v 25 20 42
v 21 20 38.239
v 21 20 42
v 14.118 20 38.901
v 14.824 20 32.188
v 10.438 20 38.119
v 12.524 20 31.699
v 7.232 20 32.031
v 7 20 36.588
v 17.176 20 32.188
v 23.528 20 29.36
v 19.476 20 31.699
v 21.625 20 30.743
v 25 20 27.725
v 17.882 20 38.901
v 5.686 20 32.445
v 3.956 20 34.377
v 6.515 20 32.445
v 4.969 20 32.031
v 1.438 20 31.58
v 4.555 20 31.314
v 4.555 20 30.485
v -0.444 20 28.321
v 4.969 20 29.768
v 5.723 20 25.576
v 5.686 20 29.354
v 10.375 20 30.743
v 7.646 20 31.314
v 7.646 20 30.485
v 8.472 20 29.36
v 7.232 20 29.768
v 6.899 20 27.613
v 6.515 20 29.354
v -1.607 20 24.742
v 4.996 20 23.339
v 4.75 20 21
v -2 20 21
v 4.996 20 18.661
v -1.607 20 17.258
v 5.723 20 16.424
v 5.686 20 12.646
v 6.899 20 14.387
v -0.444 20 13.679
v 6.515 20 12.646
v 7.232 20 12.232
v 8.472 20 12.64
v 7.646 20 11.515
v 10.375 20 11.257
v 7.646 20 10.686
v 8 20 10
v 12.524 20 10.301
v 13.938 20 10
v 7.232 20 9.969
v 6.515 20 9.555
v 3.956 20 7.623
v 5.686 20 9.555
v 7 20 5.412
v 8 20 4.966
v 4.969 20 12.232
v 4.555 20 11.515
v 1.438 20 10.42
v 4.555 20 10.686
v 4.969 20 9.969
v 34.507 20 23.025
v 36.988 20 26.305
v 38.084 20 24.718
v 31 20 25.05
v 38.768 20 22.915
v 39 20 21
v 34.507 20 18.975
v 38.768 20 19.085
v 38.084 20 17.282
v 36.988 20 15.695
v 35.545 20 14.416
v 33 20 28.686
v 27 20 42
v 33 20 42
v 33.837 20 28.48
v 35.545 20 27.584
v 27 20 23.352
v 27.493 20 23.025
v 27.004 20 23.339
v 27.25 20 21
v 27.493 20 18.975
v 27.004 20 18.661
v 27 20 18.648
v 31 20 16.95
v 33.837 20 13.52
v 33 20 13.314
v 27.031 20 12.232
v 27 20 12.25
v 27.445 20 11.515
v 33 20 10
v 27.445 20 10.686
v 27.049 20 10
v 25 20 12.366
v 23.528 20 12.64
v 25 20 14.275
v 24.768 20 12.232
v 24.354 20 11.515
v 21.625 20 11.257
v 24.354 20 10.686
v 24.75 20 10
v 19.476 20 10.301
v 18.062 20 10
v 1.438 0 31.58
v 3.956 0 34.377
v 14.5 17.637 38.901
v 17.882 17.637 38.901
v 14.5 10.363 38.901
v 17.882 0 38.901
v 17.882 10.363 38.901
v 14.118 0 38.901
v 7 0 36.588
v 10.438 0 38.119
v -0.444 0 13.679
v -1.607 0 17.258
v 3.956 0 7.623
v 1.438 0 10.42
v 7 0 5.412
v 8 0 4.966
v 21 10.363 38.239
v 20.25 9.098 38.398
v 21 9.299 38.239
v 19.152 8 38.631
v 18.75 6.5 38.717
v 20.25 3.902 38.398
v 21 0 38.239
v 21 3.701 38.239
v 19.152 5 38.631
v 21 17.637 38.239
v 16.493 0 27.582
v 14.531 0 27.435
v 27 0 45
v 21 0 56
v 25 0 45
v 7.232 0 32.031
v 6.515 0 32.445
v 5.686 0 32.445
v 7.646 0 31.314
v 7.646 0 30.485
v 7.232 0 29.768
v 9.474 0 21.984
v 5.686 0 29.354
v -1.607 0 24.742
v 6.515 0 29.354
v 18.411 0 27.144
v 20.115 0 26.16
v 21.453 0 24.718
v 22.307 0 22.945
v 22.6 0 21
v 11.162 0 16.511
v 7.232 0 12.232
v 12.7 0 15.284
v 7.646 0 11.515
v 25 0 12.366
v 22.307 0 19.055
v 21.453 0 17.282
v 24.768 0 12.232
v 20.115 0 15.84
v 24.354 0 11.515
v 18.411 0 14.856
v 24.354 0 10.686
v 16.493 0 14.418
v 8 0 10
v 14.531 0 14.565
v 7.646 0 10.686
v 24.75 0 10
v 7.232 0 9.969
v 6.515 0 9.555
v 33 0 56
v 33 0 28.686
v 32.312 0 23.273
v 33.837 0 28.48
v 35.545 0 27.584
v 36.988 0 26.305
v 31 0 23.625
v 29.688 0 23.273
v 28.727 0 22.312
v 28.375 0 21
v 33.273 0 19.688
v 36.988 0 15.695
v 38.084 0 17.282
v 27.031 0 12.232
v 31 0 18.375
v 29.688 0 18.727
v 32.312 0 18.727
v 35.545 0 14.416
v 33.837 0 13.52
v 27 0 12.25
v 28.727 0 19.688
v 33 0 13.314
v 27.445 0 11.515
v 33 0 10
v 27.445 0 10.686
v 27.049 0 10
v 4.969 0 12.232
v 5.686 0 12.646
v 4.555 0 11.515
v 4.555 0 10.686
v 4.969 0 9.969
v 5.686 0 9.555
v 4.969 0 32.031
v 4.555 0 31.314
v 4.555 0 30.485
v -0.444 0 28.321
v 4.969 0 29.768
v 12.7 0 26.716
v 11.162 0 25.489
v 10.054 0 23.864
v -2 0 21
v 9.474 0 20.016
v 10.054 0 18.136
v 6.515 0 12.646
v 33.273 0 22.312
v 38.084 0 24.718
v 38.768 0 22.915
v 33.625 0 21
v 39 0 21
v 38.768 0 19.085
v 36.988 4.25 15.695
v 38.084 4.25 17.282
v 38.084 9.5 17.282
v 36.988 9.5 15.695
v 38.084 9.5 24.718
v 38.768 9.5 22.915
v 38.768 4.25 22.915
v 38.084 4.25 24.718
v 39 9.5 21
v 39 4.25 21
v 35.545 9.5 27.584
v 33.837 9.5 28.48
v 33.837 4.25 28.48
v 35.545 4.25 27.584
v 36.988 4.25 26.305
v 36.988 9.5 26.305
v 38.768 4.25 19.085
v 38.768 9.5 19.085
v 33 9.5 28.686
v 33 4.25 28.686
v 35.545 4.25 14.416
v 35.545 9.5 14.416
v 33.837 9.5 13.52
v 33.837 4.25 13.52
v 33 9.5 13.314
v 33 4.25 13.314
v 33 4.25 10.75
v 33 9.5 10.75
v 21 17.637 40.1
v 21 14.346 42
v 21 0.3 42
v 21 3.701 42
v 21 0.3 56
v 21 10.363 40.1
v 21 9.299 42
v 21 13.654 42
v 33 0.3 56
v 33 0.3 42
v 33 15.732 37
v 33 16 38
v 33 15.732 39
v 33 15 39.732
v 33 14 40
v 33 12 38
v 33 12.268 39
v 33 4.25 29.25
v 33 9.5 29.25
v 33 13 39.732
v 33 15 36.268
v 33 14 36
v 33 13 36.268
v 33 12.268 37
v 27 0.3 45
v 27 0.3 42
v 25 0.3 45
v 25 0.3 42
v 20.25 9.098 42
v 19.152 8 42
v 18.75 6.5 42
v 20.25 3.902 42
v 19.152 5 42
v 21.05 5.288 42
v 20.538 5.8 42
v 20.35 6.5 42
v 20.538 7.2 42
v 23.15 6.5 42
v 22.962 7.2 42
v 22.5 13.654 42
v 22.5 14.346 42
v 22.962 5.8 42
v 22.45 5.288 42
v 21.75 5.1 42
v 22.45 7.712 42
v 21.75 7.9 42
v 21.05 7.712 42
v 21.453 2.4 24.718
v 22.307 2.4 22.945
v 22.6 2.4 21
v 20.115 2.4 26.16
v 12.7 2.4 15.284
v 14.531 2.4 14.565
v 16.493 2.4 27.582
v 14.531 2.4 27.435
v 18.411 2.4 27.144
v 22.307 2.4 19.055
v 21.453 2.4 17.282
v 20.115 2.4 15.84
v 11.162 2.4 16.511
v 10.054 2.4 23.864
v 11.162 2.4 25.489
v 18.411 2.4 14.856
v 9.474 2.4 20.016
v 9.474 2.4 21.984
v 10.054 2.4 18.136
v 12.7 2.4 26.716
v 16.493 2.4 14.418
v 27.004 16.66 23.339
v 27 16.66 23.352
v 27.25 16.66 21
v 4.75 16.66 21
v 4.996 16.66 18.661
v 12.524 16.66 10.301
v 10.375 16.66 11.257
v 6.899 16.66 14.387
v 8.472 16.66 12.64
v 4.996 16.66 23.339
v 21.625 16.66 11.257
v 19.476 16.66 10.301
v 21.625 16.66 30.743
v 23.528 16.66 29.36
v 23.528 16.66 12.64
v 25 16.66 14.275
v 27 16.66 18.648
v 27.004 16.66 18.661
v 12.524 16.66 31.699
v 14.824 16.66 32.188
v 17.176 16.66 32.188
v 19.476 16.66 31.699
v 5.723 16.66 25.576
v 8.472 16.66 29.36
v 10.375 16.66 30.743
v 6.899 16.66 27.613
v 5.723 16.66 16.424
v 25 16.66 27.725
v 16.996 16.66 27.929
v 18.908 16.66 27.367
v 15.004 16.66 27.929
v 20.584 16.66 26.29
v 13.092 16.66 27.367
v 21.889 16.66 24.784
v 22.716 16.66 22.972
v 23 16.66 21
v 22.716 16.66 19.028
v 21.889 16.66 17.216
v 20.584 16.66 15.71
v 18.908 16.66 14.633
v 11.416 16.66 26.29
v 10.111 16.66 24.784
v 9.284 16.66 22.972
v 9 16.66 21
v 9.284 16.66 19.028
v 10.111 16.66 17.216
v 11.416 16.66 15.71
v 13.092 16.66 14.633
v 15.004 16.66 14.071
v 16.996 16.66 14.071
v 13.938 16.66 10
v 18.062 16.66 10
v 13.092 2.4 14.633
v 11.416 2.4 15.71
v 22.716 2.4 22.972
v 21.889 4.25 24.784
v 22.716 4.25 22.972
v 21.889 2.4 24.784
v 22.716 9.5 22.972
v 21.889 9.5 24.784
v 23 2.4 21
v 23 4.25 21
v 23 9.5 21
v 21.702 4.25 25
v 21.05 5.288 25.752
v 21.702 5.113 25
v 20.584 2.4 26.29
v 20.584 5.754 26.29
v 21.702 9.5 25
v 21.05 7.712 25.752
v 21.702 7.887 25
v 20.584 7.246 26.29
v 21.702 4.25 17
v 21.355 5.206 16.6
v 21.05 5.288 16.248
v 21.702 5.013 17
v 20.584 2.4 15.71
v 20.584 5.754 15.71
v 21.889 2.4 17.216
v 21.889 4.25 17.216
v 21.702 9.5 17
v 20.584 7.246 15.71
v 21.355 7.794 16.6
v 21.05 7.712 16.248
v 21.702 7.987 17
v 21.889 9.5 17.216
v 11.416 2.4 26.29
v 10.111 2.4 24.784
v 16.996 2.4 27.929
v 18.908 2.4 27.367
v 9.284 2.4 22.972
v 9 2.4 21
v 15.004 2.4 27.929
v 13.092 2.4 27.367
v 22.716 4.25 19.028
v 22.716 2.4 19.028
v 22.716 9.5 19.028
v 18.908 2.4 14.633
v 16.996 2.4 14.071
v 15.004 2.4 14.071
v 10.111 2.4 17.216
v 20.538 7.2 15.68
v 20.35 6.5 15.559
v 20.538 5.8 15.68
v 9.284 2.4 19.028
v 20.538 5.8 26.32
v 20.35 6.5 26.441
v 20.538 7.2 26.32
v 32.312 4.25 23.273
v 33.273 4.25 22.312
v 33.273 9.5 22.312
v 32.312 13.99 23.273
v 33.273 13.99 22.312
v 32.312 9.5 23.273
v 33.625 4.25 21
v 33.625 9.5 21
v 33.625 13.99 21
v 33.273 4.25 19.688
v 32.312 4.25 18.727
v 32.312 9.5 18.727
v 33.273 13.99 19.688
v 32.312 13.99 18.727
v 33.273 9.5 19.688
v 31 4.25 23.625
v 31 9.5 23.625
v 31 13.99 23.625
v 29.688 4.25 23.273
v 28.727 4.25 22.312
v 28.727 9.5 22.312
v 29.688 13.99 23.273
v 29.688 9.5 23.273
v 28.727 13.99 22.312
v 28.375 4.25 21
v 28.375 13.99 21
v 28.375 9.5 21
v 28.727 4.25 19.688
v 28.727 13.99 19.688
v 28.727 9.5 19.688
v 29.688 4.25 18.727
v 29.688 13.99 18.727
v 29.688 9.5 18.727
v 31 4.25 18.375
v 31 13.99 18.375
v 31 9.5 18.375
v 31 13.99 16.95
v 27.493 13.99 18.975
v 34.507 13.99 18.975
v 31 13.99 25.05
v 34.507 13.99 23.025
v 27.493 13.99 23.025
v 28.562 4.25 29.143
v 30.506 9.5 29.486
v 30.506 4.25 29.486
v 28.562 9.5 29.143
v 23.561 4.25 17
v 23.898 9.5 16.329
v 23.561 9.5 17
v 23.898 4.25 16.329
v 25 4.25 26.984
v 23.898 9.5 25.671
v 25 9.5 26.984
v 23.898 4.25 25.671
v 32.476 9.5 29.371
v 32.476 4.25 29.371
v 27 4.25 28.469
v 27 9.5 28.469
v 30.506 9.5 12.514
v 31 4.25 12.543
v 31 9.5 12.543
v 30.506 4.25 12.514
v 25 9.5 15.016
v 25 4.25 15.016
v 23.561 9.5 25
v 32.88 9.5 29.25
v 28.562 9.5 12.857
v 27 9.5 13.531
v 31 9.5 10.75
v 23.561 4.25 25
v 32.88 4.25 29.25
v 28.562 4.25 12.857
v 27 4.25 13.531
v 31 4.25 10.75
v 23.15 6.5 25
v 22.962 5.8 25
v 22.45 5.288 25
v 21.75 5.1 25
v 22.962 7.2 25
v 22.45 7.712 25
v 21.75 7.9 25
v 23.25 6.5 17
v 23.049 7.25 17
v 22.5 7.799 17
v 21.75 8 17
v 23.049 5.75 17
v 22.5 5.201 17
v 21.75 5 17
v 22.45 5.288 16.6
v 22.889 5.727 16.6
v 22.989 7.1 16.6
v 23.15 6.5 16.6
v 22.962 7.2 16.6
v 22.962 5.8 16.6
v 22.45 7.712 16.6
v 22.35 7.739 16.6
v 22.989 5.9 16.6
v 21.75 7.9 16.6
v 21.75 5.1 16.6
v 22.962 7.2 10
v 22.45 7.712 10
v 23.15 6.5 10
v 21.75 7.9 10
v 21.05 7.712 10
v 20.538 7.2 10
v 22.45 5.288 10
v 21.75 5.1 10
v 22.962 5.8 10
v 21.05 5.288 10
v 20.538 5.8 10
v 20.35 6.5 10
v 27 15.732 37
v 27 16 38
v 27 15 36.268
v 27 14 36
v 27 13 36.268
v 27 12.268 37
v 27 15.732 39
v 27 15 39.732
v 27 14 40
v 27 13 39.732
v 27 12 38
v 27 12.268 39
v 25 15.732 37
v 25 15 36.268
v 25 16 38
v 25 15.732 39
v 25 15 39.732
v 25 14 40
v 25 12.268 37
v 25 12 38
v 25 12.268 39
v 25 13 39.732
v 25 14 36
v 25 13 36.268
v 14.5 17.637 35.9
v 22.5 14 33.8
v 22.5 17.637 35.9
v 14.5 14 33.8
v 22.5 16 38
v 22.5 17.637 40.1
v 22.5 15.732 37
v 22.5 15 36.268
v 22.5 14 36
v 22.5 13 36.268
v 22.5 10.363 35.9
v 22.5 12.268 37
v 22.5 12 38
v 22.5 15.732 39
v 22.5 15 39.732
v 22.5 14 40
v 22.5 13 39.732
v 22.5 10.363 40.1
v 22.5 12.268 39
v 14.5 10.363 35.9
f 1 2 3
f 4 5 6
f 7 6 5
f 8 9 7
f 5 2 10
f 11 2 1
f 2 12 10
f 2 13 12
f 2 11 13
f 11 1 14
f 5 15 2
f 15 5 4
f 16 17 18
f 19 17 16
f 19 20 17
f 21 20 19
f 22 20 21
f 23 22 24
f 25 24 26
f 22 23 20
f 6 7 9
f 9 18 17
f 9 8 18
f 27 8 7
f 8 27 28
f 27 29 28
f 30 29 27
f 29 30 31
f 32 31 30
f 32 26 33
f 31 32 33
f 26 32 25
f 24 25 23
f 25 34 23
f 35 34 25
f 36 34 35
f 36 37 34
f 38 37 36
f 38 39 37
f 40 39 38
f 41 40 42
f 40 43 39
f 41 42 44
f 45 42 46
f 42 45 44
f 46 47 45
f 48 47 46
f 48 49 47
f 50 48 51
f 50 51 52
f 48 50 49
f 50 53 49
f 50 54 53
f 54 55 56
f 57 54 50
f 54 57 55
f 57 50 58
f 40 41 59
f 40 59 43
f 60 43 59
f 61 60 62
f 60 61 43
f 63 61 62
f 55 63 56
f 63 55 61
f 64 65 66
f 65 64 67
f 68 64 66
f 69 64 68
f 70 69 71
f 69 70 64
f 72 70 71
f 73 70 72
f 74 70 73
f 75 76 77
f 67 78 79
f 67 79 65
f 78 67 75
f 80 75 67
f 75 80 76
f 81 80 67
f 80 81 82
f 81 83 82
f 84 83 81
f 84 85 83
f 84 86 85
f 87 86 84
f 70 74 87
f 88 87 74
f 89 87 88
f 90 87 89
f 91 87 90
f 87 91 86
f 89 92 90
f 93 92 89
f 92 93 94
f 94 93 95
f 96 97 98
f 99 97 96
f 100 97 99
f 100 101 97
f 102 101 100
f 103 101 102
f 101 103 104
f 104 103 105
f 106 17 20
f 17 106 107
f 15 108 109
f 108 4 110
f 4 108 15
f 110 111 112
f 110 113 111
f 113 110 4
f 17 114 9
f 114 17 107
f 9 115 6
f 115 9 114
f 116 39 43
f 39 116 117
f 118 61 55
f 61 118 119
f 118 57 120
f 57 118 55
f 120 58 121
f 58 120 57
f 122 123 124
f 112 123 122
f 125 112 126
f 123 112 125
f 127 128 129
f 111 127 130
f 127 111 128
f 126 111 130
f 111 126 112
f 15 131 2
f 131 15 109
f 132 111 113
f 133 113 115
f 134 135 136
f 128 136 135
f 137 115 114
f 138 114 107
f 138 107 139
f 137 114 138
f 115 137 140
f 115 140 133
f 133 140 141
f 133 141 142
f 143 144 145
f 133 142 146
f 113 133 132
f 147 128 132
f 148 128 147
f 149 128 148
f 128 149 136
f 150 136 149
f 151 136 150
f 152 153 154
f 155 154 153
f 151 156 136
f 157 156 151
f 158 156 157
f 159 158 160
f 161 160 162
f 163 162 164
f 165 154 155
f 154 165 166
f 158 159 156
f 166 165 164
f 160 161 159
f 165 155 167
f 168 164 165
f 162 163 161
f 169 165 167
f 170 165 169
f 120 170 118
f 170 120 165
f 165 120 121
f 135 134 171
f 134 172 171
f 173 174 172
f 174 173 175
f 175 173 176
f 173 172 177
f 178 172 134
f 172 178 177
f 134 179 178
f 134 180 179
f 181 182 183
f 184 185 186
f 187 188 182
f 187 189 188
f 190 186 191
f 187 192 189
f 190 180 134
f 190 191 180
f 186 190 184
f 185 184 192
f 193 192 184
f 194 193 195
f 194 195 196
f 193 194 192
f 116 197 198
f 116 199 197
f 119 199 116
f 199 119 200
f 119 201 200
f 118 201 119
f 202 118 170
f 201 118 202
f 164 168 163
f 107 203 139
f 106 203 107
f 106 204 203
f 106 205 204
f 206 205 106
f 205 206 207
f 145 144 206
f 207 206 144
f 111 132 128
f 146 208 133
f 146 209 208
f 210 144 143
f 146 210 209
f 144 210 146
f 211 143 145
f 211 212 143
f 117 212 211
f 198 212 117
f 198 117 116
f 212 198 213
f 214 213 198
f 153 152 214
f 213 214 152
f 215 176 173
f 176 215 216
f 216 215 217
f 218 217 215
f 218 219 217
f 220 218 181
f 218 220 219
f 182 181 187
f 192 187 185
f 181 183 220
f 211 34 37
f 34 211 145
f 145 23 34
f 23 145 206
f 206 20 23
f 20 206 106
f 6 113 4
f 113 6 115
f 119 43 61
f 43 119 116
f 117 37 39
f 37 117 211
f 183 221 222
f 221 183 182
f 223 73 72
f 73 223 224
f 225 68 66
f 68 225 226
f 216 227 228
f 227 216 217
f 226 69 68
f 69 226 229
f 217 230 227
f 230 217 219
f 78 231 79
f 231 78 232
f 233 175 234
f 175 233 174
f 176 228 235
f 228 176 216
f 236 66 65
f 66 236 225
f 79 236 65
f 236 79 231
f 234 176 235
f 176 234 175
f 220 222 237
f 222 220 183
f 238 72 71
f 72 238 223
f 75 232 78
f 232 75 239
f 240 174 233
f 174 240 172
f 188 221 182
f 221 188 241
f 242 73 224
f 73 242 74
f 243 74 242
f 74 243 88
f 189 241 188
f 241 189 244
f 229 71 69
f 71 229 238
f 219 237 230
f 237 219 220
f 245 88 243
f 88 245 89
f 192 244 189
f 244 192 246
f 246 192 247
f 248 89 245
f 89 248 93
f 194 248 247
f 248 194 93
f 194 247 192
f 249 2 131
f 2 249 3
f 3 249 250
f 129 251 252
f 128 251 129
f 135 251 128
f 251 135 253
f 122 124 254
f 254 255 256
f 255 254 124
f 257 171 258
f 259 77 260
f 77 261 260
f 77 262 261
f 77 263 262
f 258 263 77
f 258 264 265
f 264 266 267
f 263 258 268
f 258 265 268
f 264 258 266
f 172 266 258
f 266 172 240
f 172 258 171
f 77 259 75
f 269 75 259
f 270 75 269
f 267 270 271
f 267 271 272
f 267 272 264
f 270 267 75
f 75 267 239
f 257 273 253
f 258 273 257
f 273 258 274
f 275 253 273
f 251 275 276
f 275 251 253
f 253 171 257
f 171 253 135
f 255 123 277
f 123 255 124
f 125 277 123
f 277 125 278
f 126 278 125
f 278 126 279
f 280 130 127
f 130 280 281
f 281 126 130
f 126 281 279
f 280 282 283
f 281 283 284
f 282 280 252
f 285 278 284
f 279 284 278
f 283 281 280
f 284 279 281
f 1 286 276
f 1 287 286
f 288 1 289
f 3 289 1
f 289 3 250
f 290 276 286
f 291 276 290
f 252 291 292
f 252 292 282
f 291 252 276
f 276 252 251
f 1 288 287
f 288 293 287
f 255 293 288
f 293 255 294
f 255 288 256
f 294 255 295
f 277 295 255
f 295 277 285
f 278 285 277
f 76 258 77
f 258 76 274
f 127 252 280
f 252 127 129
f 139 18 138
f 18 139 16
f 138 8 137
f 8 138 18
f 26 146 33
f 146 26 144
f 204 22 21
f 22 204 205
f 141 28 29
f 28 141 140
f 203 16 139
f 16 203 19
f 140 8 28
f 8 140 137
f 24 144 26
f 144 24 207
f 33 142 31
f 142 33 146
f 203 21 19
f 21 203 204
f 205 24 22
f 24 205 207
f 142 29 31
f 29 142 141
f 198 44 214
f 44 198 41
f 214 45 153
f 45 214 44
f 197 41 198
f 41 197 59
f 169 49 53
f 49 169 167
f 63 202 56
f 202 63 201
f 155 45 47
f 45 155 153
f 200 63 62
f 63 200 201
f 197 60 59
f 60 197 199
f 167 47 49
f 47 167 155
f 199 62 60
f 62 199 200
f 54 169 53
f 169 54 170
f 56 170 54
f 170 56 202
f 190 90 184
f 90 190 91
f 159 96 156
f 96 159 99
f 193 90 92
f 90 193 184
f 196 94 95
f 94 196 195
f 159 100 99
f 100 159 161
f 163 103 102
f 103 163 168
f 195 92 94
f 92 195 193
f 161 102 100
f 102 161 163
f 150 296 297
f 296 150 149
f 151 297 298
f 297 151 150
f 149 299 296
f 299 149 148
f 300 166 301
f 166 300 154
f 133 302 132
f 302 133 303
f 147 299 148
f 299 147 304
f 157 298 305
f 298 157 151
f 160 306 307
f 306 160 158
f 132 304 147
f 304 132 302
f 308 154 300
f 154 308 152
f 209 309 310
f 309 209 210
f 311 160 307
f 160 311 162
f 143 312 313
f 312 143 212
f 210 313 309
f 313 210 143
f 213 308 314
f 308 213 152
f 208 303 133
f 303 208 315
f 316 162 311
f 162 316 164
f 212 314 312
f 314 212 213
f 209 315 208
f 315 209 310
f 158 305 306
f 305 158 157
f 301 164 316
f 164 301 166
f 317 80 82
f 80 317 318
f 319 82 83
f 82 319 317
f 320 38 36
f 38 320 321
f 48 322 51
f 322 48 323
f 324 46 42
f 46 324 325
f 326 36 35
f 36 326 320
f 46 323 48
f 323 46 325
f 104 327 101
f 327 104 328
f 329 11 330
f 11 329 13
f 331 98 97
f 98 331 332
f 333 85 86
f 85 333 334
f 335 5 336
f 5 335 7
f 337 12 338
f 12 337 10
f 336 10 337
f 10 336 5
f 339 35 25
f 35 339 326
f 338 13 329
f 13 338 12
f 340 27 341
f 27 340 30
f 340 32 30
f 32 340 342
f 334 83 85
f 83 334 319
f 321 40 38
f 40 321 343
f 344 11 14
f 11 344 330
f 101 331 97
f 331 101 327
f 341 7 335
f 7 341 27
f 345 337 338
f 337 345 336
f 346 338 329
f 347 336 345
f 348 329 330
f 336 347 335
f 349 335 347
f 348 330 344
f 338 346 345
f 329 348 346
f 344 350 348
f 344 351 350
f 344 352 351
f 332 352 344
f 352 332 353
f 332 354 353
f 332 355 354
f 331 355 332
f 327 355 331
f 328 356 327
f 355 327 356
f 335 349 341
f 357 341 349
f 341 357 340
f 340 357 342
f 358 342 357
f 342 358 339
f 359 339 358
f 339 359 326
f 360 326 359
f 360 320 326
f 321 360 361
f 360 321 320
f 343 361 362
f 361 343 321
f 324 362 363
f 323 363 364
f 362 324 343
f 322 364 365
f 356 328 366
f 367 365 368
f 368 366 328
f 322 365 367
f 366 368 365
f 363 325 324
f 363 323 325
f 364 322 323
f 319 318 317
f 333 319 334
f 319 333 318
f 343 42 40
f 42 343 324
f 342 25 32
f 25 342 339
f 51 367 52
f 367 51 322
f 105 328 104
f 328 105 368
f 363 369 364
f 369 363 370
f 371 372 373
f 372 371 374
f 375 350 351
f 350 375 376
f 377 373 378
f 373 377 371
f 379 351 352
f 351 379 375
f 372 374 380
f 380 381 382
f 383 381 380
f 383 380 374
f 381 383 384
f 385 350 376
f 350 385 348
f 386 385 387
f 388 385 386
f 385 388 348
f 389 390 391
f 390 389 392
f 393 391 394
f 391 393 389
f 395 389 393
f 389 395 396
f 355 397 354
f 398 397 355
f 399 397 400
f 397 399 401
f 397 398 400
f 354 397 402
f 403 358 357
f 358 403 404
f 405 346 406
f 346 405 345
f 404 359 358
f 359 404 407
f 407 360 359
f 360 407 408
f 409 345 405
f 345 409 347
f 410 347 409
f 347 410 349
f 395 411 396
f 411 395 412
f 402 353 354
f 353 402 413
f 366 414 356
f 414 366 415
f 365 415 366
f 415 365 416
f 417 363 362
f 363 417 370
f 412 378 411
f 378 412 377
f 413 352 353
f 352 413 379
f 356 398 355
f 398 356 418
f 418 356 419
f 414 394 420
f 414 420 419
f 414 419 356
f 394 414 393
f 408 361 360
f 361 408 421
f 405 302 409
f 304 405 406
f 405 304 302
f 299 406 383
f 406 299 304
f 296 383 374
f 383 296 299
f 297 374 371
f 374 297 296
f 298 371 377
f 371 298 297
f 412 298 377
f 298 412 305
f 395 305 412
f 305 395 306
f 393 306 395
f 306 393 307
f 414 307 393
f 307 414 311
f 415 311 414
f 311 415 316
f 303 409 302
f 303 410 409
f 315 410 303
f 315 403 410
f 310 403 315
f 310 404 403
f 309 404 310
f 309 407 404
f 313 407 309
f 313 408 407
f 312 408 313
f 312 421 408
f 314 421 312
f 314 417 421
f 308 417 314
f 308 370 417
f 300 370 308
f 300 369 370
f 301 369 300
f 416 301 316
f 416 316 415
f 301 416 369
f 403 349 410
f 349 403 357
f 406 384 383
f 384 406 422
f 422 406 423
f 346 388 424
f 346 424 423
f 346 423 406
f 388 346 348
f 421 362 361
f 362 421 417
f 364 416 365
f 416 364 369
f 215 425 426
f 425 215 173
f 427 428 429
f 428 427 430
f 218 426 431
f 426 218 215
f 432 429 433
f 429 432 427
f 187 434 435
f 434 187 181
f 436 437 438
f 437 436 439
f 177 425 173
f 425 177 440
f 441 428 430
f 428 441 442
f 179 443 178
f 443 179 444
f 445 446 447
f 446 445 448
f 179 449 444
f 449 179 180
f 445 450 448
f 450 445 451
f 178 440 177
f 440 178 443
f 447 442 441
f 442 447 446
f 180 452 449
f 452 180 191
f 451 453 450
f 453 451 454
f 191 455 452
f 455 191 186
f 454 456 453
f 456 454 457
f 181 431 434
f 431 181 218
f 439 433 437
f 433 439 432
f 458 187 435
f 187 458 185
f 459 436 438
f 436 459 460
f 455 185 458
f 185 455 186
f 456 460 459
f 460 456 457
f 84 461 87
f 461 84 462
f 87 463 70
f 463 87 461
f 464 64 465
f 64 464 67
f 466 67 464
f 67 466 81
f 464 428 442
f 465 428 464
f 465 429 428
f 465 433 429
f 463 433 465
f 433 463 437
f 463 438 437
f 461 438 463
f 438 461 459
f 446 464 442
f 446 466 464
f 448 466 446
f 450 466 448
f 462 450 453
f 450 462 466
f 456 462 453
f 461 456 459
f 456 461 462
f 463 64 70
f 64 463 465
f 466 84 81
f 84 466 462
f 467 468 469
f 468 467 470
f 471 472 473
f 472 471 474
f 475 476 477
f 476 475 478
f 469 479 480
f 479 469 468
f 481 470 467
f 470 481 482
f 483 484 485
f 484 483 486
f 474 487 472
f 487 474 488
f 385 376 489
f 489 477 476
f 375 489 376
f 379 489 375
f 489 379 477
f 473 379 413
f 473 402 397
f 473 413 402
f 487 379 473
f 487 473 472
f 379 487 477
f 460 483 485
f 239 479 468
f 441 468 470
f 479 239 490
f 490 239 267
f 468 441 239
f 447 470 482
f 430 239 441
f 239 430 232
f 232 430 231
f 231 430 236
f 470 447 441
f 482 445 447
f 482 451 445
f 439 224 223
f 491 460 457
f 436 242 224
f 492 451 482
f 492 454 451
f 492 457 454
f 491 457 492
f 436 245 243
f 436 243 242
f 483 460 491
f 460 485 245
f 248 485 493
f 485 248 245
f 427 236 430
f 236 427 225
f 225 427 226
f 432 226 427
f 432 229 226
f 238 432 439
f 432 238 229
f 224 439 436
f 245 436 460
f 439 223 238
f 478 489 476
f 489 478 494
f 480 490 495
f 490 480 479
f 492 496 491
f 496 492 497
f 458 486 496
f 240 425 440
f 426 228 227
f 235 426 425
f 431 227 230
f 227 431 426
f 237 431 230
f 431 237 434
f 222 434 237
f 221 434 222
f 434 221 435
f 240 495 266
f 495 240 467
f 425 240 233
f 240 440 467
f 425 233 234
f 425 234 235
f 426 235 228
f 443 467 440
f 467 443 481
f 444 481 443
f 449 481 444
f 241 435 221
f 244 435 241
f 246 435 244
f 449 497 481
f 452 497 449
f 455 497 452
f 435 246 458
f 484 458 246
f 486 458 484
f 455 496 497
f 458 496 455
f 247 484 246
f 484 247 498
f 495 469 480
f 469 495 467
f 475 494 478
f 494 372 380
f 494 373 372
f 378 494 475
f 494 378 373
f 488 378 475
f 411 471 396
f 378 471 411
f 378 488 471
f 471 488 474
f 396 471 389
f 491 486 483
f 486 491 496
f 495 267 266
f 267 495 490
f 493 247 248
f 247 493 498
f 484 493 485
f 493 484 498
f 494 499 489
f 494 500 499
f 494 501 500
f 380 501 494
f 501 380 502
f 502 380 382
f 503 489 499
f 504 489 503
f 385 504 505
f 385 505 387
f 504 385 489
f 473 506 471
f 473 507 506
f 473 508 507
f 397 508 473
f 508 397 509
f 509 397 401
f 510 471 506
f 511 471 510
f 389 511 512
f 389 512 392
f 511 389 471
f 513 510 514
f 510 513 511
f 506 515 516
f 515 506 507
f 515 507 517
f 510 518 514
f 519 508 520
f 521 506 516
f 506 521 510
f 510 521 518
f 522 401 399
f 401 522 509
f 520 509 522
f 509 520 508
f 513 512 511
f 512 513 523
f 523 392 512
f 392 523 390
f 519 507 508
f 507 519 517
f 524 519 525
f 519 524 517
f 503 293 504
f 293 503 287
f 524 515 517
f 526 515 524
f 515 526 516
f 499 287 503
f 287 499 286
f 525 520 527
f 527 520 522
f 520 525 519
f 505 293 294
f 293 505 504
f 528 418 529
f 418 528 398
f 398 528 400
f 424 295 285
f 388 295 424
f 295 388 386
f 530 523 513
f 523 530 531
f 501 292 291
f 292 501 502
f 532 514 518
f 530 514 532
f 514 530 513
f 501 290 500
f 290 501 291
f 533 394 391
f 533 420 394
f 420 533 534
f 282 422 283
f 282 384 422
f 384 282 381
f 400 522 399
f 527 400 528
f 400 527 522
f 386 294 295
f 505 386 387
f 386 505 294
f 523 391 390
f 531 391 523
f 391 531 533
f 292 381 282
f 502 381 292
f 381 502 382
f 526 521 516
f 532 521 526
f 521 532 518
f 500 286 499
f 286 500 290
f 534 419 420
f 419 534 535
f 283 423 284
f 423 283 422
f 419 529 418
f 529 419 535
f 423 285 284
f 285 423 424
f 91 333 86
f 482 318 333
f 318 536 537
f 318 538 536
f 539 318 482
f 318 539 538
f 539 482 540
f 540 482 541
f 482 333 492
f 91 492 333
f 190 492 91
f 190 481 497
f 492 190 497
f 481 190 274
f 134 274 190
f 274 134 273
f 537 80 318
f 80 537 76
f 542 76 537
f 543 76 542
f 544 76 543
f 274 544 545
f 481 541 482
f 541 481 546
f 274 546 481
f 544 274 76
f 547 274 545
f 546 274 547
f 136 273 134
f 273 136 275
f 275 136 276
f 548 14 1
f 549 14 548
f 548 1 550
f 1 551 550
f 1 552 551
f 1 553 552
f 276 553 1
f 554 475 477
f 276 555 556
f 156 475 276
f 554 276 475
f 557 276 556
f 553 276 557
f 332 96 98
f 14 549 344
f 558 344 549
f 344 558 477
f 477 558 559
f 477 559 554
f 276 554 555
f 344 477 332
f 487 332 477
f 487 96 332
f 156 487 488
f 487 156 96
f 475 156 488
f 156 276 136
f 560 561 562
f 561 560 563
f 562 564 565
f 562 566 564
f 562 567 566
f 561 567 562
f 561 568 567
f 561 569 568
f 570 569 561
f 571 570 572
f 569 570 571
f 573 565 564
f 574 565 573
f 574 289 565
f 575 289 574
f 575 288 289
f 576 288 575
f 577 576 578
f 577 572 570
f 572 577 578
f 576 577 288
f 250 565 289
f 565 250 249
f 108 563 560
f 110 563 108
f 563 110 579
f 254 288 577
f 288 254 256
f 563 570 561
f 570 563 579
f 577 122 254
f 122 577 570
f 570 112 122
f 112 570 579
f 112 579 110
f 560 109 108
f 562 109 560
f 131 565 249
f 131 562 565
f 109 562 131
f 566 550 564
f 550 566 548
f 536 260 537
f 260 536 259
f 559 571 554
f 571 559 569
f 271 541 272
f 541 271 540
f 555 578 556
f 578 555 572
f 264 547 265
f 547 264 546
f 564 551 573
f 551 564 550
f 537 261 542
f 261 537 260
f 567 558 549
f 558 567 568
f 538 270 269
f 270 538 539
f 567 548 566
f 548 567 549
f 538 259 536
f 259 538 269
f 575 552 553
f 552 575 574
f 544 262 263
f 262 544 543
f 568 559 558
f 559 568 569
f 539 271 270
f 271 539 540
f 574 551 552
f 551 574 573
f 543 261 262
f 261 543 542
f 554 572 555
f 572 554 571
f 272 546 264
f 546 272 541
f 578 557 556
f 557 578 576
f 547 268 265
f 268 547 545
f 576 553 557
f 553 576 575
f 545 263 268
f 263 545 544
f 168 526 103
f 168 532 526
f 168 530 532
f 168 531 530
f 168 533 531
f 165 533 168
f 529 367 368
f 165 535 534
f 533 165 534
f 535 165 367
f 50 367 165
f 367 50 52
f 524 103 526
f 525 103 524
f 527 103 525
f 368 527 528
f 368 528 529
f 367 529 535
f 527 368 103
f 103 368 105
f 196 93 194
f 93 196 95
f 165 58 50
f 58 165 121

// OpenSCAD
first_layer = 0.3;

difference() {
	
	union() {
		//main cylinder
		translate([16,20,21]) rotate([90,0,0]) cylinder(h=20, r=18);//cube([44, 20, 42]);
		
		//bearing mount
		translate([31,20,21]) rotate([90,0,0]) cylinder (h=20, r=8);
		
		//V3 Mount
		translate([9,0,-7]) cube([24, 20, 22]);
		translate([21,first_layer/2,-11]) rotate([90,0,0]) cube([24, 22, first_layer], center=true);
		translate([27,first_layer/2,45]) rotate([90,0,0]) cube([12, 22, first_layer], center=true);
		
		//filament support
		translate([21.75,6.5,34]) rotate([0,0,0]) cylinder (h=8, r=3, $fn=12);
		
		//groovemount supports
//		translate([33,6.5,-7]) rotate([0,0,0]) cylinder (h=16, r=5, $fn=12);
//		translate([9,6.5,-7]) rotate([0,0,0]) cylinder (h=16, r=5, $fn=12);
		
		//clamp
		translate([21,0,28]) cube([12, 20, 14]);
	}
	
	//pulley opening
	translate([16,21,21]) rotate([90,0,0]){
		cylinder (h=22, r=6.6);
		
		rotate([0,0,45]) {
		//translate([14,0,0]) cylinder(h=22, r=1.6, $fn=12);
		translate([0,14,0]) cylinder(h=22, r=1.6, $fn=12);
		translate([-14,0,0]) cylinder(h=22, r=1.6, $fn=12);
		translate([0,-14,0]) cylinder(h=22, r=1.6, $fn=12);
		}
	}
	
	//gearhead indentation
	translate([16,20.01,21]) rotate([90,0,0]) cylinder (h=3.35, r=11.25);

	//pulley hub indentation
	translate([16,20-2,21]) rotate([90,0,0]) cylinder (h=15.6, r=7);
	
	//bearing screws
	translate([31,21,21]) rotate([90,0,0]) cylinder (h=22, r=2.625, $fn=12); //precision m5
	//translate([31,21,21]) rotate([90,0,0]) cylinder (h=22, r=2.6, $fn=12); //regular M5 screw
	translate([31,22,21]) rotate([90,30,0]) cylinder (h=8.01, r=8.1/2, $fn=6); //M4
	//#translate([31,22,21]) rotate([90,30,0]) cylinder (h=8.01, r=4.7, $fn=6); //M5
	
	//bearing
	translate([31,9.5,21]) rotate([90,0,0]) cylinder (h=5.25, r=8.5);
	translate([31,9.5-5.25,21-8.25-2]) cube([20, 5.25, 18.5]);
	//opening between bearing and pulley
	translate([20,9.5-5.25,21-8.25+3.25+1]) cube([10, 5.25, 8]);

	//filament path chamfer
	translate([21.75,6.5,15]) rotate([0,0,0]) cylinder (h=2, r1=1, r2=1.5, $fn=12);		
	
	//filament path
	translate([21.75,6.5,-10]) rotate([0,0,0]) cylinder (h=60, r=1.4, $fn=12); 
	
	//V3 Mount
//	translate([21.75,6.5,-2]) rotate([0,0,0]) cylinder (h=5, r=8.25);
	translate([21.75,6.5,-7]) rotate([0,0,0]) cylinder (h=8, r=4.5);
//	translate([21.75-8,6.5-8,-2]) cube([16, 8, 5]);
//	translate([21.75-6,6.5-7,-7]) cube([12, 7, 5]);
translate([21.75,6.5,3.5]) rotate([90,0,0]) cylinder (h=10, r=1,  $fn=12);
	
	//groovemount supports
//	translate([33,6.5,-8]) rotate([0,0,0]) cylinder (h=20, r=1.6, $fn=12);
//	translate([33,6.5,7]) rotate([0,0,0]) cylinder (h=3, r=3.5, $fn=6);

//	translate([9,6.5,-8]) rotate([0,0,0]) cylinder (h=20, r=1.6, $fn=12);
//	translate([9,6.5,7]) rotate([0,0,0]) cylinder (h=3, r=3.5, $fn=6);
//	translate([3,3,7]) cube([8, 7, 3]);
	
	//clamp slit
	translate([25,-1,10]) cube([2, 22, 35]);
	//clamp nut
	translate([14.5,14,38]) rotate([0,90,0]) cylinder (h=8, r=4.2, $fn=6);
	//clamp screw hole
	translate([17,14,38]) rotate([0,90,0]) cylinder (h=17, r=2, $fn=12);
	
	translate([8,-2,-25])cube(35,20,10);
}
